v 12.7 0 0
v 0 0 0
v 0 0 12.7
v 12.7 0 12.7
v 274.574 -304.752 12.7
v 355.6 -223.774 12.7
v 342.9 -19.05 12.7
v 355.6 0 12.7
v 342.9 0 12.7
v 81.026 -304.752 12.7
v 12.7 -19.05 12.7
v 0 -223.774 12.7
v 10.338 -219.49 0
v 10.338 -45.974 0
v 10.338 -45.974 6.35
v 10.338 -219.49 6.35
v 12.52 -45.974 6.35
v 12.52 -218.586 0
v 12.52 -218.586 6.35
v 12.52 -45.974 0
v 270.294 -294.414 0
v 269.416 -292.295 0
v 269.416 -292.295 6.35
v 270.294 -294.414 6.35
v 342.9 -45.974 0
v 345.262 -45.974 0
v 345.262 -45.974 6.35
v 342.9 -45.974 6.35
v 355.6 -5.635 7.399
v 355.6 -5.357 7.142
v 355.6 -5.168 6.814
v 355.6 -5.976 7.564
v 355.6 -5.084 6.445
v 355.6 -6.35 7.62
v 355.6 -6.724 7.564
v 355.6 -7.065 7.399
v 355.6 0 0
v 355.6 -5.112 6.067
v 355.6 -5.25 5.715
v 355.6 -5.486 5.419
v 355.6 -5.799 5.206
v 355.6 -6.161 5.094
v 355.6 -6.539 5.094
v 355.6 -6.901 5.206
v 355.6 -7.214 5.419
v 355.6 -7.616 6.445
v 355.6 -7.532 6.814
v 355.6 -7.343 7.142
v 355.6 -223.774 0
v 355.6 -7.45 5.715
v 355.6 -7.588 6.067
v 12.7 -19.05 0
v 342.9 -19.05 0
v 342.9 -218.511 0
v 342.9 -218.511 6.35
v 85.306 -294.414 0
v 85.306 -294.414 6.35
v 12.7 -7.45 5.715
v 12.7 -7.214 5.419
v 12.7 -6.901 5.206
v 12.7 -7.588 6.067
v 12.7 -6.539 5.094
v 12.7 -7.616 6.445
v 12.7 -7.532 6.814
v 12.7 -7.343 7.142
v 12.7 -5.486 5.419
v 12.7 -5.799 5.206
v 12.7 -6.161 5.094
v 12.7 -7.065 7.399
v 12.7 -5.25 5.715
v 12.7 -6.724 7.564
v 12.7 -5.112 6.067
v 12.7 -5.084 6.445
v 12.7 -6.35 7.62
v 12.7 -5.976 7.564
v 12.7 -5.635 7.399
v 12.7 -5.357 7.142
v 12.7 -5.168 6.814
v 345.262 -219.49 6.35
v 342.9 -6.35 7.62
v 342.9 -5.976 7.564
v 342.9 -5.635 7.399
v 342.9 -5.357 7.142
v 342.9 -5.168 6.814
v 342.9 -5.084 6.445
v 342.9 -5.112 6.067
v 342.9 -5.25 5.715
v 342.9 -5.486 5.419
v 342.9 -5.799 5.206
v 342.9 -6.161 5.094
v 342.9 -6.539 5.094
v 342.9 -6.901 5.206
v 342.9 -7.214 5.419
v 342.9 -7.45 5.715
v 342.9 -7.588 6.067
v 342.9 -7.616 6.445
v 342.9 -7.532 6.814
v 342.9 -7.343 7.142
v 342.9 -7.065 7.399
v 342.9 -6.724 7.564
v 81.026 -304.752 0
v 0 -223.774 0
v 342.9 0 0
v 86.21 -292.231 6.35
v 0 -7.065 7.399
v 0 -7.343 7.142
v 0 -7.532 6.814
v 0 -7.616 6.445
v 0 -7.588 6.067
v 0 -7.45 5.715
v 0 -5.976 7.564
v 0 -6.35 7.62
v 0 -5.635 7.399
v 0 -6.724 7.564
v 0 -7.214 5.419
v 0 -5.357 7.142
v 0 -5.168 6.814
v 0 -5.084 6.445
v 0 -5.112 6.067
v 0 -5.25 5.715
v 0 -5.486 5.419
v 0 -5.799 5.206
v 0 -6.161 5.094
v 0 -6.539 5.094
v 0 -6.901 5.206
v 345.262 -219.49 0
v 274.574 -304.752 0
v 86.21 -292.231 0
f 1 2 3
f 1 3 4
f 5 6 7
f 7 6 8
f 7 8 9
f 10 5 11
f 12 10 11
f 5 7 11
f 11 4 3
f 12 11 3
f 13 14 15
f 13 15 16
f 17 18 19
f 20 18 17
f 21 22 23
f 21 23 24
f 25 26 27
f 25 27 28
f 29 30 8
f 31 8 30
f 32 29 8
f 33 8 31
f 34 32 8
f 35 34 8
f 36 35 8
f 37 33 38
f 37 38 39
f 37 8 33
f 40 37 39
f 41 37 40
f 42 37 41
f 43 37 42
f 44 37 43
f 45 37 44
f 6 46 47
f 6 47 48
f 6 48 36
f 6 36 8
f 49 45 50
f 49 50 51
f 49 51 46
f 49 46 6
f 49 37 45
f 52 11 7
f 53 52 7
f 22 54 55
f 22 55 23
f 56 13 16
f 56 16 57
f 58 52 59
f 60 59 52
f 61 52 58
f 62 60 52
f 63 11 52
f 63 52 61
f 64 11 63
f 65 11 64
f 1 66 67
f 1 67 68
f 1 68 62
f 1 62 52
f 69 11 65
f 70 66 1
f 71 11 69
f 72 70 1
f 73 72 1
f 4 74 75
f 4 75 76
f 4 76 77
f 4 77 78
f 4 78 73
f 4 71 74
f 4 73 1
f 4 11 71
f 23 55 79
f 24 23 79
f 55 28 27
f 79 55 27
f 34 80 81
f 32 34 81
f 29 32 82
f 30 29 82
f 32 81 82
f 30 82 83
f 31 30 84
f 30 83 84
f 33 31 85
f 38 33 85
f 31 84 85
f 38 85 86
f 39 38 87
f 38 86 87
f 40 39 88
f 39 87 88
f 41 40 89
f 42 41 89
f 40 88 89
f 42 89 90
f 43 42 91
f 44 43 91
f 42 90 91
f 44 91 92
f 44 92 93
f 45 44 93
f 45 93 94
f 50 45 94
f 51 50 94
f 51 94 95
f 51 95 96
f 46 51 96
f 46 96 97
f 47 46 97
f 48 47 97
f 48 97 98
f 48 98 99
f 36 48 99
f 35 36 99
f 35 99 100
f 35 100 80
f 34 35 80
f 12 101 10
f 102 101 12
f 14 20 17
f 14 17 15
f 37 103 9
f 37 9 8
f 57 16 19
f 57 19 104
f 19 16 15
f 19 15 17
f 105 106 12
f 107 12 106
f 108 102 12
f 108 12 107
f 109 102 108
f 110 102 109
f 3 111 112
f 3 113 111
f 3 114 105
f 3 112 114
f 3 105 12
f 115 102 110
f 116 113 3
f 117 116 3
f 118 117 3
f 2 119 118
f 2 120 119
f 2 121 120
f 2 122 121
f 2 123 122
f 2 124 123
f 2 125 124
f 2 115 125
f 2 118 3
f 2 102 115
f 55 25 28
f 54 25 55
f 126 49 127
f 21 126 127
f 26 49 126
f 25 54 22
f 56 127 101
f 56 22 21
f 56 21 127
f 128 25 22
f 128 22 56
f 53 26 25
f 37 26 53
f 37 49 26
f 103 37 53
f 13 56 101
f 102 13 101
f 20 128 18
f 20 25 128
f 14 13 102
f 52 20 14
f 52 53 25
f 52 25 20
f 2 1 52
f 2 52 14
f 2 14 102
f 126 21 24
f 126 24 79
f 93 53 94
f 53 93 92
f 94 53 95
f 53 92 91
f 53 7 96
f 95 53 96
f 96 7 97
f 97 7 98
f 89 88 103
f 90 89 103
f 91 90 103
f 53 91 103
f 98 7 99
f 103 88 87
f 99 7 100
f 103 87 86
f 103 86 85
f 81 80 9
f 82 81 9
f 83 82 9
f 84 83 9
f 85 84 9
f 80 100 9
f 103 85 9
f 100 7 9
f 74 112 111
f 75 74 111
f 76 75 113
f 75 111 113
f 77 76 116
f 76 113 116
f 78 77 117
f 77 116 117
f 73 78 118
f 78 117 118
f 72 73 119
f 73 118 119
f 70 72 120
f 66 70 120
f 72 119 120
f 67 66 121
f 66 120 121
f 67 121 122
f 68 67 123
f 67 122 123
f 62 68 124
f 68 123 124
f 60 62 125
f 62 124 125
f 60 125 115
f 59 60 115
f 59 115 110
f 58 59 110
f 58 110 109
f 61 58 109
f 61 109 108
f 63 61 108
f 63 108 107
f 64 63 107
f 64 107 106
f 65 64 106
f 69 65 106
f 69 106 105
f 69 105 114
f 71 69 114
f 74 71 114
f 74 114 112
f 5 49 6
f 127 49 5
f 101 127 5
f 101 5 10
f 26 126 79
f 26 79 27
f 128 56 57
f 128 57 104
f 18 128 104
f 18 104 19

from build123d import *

# Parameters (mm, degrees)
BOSS_EXTRUDE1_DEPTH = 12.7
SKETCH2_W           = 330.2
SKETCH2_H           = 19.05
CUT_EXTRUDE1_DEPTH  = 13.7
SKETCH3_R           = 1.27
CUT_EXTRUDE2_DEPTH  = 356.6
CUT_EXTRUDE7_DEPTH  = 6.35


with BuildPart() as part:
    # Sketch1 → Boss-Extrude1 (new body)
    with BuildSketch(Plane.XY):
        Polygon((0, 0), (355.6, 0), (355.6, -223.774), (274.574, -304.751813258), (81.026, -304.751813258), (0, -223.774), align=None)
    extrude(amount=BOSS_EXTRUDE1_DEPTH)

    # Sketch2 → Cut-Extrude1 (cut, through all)
    with BuildSketch(Plane.XY.offset(12.7)):
        with Locations((177.8, -9.525)):
            Rectangle(SKETCH2_W, SKETCH2_H)
    extrude(amount=-CUT_EXTRUDE1_DEPTH, mode=Mode.SUBTRACT)

    # Sketch3 → Cut-Extrude2 (cut, through all)
    with BuildSketch(Plane.ZY):
        with Locations((6.35, -6.35)):
            Circle(SKETCH3_R)
    extrude(amount=-CUT_EXTRUDE2_DEPTH, mode=Mode.SUBTRACT)

    # Sketch4 → Cut-Extrude7 (cut)
    with BuildSketch(Plane.XY):
        Polygon((10.3378, -45.974), (10.3378, -219.490141692), (85.306255844, -294.414013258), (86.209906071, -292.23149061), (12.520322648, -218.58573091), (12.520322648, -45.974), align=None)
        Polygon((270.293744156, -294.414013258), (345.2622, -219.490141692), (345.2622, -45.974), (342.9, -45.974), (342.9, -218.511274805), (269.416328936, -292.294854171), align=None)
    extrude(amount=CUT_EXTRUDE7_DEPTH, mode=Mode.SUBTRACT)


solid = part.part
